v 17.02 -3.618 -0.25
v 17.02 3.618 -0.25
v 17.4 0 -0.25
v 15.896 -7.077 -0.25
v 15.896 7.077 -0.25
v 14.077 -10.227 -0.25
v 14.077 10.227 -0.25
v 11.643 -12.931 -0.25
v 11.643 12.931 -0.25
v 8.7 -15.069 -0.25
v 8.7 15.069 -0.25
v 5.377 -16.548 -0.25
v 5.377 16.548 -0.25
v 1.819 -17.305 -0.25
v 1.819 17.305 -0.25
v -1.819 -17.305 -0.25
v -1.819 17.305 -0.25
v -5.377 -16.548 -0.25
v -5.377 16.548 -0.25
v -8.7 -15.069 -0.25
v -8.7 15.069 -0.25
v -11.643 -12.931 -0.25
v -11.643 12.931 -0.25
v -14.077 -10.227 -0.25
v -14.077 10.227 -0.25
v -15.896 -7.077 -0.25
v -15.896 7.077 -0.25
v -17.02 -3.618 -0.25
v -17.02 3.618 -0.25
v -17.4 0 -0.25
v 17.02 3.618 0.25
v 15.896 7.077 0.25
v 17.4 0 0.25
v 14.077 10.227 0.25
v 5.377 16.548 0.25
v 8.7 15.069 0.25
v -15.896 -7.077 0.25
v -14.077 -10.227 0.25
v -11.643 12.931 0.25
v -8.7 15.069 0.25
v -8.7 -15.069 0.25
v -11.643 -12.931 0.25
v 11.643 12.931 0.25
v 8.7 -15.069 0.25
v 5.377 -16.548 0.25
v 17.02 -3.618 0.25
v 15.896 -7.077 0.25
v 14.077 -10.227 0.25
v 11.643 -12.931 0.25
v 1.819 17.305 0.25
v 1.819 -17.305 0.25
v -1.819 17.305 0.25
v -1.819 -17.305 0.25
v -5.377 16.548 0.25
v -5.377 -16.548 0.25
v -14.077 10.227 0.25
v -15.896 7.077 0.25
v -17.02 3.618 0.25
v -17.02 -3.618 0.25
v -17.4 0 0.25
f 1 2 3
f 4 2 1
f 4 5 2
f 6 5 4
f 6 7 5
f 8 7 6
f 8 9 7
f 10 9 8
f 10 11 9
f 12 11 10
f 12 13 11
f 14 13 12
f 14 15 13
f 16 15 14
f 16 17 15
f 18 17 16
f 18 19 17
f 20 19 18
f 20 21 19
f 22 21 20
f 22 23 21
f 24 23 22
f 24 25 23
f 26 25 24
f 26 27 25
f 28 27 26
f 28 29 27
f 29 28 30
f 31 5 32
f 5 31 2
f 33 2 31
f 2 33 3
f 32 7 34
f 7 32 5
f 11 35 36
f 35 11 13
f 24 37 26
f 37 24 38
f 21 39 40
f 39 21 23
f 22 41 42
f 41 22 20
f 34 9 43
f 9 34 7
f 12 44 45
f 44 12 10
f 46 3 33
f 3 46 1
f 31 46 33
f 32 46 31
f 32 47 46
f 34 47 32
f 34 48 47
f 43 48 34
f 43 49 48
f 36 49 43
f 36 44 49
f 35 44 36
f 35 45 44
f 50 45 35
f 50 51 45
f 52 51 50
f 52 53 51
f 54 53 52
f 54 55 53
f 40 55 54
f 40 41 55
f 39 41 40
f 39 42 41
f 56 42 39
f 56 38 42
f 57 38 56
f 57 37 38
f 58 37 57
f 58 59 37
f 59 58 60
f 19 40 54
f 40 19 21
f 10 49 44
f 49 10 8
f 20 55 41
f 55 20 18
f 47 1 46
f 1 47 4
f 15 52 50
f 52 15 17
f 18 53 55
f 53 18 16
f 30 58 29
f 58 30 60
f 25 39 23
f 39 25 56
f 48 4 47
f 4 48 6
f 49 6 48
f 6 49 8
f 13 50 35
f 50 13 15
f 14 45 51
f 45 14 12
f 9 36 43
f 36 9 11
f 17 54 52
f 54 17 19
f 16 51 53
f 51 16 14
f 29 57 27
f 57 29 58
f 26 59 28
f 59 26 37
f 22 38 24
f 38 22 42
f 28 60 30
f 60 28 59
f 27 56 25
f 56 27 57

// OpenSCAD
// Parameters
r_outer = 17.4; //[8.7:34.8:0.1]
r_step = 11.4; //[5.7:22.8:0.1]
r_hub = 9.0; //[4.5:18.0:0.1]
thickness = 0.5; //[0.25:1.0:0.05]

// Geometry
module outer_disk() {
  cylinder(r=r_outer, h=thickness, center=true);
}

module inner_step() {
  cylinder(r=r_step, h=thickness, center=true);
}

module center_hub() {
  cylinder(r=r_hub, h=thickness, center=true);
}

// Final Union
module stepped_disk_union() {
  union() {
    outer_disk();
    inner_step();
    center_hub();
  }
}

// Render the final geometry
stepped_disk_union();
